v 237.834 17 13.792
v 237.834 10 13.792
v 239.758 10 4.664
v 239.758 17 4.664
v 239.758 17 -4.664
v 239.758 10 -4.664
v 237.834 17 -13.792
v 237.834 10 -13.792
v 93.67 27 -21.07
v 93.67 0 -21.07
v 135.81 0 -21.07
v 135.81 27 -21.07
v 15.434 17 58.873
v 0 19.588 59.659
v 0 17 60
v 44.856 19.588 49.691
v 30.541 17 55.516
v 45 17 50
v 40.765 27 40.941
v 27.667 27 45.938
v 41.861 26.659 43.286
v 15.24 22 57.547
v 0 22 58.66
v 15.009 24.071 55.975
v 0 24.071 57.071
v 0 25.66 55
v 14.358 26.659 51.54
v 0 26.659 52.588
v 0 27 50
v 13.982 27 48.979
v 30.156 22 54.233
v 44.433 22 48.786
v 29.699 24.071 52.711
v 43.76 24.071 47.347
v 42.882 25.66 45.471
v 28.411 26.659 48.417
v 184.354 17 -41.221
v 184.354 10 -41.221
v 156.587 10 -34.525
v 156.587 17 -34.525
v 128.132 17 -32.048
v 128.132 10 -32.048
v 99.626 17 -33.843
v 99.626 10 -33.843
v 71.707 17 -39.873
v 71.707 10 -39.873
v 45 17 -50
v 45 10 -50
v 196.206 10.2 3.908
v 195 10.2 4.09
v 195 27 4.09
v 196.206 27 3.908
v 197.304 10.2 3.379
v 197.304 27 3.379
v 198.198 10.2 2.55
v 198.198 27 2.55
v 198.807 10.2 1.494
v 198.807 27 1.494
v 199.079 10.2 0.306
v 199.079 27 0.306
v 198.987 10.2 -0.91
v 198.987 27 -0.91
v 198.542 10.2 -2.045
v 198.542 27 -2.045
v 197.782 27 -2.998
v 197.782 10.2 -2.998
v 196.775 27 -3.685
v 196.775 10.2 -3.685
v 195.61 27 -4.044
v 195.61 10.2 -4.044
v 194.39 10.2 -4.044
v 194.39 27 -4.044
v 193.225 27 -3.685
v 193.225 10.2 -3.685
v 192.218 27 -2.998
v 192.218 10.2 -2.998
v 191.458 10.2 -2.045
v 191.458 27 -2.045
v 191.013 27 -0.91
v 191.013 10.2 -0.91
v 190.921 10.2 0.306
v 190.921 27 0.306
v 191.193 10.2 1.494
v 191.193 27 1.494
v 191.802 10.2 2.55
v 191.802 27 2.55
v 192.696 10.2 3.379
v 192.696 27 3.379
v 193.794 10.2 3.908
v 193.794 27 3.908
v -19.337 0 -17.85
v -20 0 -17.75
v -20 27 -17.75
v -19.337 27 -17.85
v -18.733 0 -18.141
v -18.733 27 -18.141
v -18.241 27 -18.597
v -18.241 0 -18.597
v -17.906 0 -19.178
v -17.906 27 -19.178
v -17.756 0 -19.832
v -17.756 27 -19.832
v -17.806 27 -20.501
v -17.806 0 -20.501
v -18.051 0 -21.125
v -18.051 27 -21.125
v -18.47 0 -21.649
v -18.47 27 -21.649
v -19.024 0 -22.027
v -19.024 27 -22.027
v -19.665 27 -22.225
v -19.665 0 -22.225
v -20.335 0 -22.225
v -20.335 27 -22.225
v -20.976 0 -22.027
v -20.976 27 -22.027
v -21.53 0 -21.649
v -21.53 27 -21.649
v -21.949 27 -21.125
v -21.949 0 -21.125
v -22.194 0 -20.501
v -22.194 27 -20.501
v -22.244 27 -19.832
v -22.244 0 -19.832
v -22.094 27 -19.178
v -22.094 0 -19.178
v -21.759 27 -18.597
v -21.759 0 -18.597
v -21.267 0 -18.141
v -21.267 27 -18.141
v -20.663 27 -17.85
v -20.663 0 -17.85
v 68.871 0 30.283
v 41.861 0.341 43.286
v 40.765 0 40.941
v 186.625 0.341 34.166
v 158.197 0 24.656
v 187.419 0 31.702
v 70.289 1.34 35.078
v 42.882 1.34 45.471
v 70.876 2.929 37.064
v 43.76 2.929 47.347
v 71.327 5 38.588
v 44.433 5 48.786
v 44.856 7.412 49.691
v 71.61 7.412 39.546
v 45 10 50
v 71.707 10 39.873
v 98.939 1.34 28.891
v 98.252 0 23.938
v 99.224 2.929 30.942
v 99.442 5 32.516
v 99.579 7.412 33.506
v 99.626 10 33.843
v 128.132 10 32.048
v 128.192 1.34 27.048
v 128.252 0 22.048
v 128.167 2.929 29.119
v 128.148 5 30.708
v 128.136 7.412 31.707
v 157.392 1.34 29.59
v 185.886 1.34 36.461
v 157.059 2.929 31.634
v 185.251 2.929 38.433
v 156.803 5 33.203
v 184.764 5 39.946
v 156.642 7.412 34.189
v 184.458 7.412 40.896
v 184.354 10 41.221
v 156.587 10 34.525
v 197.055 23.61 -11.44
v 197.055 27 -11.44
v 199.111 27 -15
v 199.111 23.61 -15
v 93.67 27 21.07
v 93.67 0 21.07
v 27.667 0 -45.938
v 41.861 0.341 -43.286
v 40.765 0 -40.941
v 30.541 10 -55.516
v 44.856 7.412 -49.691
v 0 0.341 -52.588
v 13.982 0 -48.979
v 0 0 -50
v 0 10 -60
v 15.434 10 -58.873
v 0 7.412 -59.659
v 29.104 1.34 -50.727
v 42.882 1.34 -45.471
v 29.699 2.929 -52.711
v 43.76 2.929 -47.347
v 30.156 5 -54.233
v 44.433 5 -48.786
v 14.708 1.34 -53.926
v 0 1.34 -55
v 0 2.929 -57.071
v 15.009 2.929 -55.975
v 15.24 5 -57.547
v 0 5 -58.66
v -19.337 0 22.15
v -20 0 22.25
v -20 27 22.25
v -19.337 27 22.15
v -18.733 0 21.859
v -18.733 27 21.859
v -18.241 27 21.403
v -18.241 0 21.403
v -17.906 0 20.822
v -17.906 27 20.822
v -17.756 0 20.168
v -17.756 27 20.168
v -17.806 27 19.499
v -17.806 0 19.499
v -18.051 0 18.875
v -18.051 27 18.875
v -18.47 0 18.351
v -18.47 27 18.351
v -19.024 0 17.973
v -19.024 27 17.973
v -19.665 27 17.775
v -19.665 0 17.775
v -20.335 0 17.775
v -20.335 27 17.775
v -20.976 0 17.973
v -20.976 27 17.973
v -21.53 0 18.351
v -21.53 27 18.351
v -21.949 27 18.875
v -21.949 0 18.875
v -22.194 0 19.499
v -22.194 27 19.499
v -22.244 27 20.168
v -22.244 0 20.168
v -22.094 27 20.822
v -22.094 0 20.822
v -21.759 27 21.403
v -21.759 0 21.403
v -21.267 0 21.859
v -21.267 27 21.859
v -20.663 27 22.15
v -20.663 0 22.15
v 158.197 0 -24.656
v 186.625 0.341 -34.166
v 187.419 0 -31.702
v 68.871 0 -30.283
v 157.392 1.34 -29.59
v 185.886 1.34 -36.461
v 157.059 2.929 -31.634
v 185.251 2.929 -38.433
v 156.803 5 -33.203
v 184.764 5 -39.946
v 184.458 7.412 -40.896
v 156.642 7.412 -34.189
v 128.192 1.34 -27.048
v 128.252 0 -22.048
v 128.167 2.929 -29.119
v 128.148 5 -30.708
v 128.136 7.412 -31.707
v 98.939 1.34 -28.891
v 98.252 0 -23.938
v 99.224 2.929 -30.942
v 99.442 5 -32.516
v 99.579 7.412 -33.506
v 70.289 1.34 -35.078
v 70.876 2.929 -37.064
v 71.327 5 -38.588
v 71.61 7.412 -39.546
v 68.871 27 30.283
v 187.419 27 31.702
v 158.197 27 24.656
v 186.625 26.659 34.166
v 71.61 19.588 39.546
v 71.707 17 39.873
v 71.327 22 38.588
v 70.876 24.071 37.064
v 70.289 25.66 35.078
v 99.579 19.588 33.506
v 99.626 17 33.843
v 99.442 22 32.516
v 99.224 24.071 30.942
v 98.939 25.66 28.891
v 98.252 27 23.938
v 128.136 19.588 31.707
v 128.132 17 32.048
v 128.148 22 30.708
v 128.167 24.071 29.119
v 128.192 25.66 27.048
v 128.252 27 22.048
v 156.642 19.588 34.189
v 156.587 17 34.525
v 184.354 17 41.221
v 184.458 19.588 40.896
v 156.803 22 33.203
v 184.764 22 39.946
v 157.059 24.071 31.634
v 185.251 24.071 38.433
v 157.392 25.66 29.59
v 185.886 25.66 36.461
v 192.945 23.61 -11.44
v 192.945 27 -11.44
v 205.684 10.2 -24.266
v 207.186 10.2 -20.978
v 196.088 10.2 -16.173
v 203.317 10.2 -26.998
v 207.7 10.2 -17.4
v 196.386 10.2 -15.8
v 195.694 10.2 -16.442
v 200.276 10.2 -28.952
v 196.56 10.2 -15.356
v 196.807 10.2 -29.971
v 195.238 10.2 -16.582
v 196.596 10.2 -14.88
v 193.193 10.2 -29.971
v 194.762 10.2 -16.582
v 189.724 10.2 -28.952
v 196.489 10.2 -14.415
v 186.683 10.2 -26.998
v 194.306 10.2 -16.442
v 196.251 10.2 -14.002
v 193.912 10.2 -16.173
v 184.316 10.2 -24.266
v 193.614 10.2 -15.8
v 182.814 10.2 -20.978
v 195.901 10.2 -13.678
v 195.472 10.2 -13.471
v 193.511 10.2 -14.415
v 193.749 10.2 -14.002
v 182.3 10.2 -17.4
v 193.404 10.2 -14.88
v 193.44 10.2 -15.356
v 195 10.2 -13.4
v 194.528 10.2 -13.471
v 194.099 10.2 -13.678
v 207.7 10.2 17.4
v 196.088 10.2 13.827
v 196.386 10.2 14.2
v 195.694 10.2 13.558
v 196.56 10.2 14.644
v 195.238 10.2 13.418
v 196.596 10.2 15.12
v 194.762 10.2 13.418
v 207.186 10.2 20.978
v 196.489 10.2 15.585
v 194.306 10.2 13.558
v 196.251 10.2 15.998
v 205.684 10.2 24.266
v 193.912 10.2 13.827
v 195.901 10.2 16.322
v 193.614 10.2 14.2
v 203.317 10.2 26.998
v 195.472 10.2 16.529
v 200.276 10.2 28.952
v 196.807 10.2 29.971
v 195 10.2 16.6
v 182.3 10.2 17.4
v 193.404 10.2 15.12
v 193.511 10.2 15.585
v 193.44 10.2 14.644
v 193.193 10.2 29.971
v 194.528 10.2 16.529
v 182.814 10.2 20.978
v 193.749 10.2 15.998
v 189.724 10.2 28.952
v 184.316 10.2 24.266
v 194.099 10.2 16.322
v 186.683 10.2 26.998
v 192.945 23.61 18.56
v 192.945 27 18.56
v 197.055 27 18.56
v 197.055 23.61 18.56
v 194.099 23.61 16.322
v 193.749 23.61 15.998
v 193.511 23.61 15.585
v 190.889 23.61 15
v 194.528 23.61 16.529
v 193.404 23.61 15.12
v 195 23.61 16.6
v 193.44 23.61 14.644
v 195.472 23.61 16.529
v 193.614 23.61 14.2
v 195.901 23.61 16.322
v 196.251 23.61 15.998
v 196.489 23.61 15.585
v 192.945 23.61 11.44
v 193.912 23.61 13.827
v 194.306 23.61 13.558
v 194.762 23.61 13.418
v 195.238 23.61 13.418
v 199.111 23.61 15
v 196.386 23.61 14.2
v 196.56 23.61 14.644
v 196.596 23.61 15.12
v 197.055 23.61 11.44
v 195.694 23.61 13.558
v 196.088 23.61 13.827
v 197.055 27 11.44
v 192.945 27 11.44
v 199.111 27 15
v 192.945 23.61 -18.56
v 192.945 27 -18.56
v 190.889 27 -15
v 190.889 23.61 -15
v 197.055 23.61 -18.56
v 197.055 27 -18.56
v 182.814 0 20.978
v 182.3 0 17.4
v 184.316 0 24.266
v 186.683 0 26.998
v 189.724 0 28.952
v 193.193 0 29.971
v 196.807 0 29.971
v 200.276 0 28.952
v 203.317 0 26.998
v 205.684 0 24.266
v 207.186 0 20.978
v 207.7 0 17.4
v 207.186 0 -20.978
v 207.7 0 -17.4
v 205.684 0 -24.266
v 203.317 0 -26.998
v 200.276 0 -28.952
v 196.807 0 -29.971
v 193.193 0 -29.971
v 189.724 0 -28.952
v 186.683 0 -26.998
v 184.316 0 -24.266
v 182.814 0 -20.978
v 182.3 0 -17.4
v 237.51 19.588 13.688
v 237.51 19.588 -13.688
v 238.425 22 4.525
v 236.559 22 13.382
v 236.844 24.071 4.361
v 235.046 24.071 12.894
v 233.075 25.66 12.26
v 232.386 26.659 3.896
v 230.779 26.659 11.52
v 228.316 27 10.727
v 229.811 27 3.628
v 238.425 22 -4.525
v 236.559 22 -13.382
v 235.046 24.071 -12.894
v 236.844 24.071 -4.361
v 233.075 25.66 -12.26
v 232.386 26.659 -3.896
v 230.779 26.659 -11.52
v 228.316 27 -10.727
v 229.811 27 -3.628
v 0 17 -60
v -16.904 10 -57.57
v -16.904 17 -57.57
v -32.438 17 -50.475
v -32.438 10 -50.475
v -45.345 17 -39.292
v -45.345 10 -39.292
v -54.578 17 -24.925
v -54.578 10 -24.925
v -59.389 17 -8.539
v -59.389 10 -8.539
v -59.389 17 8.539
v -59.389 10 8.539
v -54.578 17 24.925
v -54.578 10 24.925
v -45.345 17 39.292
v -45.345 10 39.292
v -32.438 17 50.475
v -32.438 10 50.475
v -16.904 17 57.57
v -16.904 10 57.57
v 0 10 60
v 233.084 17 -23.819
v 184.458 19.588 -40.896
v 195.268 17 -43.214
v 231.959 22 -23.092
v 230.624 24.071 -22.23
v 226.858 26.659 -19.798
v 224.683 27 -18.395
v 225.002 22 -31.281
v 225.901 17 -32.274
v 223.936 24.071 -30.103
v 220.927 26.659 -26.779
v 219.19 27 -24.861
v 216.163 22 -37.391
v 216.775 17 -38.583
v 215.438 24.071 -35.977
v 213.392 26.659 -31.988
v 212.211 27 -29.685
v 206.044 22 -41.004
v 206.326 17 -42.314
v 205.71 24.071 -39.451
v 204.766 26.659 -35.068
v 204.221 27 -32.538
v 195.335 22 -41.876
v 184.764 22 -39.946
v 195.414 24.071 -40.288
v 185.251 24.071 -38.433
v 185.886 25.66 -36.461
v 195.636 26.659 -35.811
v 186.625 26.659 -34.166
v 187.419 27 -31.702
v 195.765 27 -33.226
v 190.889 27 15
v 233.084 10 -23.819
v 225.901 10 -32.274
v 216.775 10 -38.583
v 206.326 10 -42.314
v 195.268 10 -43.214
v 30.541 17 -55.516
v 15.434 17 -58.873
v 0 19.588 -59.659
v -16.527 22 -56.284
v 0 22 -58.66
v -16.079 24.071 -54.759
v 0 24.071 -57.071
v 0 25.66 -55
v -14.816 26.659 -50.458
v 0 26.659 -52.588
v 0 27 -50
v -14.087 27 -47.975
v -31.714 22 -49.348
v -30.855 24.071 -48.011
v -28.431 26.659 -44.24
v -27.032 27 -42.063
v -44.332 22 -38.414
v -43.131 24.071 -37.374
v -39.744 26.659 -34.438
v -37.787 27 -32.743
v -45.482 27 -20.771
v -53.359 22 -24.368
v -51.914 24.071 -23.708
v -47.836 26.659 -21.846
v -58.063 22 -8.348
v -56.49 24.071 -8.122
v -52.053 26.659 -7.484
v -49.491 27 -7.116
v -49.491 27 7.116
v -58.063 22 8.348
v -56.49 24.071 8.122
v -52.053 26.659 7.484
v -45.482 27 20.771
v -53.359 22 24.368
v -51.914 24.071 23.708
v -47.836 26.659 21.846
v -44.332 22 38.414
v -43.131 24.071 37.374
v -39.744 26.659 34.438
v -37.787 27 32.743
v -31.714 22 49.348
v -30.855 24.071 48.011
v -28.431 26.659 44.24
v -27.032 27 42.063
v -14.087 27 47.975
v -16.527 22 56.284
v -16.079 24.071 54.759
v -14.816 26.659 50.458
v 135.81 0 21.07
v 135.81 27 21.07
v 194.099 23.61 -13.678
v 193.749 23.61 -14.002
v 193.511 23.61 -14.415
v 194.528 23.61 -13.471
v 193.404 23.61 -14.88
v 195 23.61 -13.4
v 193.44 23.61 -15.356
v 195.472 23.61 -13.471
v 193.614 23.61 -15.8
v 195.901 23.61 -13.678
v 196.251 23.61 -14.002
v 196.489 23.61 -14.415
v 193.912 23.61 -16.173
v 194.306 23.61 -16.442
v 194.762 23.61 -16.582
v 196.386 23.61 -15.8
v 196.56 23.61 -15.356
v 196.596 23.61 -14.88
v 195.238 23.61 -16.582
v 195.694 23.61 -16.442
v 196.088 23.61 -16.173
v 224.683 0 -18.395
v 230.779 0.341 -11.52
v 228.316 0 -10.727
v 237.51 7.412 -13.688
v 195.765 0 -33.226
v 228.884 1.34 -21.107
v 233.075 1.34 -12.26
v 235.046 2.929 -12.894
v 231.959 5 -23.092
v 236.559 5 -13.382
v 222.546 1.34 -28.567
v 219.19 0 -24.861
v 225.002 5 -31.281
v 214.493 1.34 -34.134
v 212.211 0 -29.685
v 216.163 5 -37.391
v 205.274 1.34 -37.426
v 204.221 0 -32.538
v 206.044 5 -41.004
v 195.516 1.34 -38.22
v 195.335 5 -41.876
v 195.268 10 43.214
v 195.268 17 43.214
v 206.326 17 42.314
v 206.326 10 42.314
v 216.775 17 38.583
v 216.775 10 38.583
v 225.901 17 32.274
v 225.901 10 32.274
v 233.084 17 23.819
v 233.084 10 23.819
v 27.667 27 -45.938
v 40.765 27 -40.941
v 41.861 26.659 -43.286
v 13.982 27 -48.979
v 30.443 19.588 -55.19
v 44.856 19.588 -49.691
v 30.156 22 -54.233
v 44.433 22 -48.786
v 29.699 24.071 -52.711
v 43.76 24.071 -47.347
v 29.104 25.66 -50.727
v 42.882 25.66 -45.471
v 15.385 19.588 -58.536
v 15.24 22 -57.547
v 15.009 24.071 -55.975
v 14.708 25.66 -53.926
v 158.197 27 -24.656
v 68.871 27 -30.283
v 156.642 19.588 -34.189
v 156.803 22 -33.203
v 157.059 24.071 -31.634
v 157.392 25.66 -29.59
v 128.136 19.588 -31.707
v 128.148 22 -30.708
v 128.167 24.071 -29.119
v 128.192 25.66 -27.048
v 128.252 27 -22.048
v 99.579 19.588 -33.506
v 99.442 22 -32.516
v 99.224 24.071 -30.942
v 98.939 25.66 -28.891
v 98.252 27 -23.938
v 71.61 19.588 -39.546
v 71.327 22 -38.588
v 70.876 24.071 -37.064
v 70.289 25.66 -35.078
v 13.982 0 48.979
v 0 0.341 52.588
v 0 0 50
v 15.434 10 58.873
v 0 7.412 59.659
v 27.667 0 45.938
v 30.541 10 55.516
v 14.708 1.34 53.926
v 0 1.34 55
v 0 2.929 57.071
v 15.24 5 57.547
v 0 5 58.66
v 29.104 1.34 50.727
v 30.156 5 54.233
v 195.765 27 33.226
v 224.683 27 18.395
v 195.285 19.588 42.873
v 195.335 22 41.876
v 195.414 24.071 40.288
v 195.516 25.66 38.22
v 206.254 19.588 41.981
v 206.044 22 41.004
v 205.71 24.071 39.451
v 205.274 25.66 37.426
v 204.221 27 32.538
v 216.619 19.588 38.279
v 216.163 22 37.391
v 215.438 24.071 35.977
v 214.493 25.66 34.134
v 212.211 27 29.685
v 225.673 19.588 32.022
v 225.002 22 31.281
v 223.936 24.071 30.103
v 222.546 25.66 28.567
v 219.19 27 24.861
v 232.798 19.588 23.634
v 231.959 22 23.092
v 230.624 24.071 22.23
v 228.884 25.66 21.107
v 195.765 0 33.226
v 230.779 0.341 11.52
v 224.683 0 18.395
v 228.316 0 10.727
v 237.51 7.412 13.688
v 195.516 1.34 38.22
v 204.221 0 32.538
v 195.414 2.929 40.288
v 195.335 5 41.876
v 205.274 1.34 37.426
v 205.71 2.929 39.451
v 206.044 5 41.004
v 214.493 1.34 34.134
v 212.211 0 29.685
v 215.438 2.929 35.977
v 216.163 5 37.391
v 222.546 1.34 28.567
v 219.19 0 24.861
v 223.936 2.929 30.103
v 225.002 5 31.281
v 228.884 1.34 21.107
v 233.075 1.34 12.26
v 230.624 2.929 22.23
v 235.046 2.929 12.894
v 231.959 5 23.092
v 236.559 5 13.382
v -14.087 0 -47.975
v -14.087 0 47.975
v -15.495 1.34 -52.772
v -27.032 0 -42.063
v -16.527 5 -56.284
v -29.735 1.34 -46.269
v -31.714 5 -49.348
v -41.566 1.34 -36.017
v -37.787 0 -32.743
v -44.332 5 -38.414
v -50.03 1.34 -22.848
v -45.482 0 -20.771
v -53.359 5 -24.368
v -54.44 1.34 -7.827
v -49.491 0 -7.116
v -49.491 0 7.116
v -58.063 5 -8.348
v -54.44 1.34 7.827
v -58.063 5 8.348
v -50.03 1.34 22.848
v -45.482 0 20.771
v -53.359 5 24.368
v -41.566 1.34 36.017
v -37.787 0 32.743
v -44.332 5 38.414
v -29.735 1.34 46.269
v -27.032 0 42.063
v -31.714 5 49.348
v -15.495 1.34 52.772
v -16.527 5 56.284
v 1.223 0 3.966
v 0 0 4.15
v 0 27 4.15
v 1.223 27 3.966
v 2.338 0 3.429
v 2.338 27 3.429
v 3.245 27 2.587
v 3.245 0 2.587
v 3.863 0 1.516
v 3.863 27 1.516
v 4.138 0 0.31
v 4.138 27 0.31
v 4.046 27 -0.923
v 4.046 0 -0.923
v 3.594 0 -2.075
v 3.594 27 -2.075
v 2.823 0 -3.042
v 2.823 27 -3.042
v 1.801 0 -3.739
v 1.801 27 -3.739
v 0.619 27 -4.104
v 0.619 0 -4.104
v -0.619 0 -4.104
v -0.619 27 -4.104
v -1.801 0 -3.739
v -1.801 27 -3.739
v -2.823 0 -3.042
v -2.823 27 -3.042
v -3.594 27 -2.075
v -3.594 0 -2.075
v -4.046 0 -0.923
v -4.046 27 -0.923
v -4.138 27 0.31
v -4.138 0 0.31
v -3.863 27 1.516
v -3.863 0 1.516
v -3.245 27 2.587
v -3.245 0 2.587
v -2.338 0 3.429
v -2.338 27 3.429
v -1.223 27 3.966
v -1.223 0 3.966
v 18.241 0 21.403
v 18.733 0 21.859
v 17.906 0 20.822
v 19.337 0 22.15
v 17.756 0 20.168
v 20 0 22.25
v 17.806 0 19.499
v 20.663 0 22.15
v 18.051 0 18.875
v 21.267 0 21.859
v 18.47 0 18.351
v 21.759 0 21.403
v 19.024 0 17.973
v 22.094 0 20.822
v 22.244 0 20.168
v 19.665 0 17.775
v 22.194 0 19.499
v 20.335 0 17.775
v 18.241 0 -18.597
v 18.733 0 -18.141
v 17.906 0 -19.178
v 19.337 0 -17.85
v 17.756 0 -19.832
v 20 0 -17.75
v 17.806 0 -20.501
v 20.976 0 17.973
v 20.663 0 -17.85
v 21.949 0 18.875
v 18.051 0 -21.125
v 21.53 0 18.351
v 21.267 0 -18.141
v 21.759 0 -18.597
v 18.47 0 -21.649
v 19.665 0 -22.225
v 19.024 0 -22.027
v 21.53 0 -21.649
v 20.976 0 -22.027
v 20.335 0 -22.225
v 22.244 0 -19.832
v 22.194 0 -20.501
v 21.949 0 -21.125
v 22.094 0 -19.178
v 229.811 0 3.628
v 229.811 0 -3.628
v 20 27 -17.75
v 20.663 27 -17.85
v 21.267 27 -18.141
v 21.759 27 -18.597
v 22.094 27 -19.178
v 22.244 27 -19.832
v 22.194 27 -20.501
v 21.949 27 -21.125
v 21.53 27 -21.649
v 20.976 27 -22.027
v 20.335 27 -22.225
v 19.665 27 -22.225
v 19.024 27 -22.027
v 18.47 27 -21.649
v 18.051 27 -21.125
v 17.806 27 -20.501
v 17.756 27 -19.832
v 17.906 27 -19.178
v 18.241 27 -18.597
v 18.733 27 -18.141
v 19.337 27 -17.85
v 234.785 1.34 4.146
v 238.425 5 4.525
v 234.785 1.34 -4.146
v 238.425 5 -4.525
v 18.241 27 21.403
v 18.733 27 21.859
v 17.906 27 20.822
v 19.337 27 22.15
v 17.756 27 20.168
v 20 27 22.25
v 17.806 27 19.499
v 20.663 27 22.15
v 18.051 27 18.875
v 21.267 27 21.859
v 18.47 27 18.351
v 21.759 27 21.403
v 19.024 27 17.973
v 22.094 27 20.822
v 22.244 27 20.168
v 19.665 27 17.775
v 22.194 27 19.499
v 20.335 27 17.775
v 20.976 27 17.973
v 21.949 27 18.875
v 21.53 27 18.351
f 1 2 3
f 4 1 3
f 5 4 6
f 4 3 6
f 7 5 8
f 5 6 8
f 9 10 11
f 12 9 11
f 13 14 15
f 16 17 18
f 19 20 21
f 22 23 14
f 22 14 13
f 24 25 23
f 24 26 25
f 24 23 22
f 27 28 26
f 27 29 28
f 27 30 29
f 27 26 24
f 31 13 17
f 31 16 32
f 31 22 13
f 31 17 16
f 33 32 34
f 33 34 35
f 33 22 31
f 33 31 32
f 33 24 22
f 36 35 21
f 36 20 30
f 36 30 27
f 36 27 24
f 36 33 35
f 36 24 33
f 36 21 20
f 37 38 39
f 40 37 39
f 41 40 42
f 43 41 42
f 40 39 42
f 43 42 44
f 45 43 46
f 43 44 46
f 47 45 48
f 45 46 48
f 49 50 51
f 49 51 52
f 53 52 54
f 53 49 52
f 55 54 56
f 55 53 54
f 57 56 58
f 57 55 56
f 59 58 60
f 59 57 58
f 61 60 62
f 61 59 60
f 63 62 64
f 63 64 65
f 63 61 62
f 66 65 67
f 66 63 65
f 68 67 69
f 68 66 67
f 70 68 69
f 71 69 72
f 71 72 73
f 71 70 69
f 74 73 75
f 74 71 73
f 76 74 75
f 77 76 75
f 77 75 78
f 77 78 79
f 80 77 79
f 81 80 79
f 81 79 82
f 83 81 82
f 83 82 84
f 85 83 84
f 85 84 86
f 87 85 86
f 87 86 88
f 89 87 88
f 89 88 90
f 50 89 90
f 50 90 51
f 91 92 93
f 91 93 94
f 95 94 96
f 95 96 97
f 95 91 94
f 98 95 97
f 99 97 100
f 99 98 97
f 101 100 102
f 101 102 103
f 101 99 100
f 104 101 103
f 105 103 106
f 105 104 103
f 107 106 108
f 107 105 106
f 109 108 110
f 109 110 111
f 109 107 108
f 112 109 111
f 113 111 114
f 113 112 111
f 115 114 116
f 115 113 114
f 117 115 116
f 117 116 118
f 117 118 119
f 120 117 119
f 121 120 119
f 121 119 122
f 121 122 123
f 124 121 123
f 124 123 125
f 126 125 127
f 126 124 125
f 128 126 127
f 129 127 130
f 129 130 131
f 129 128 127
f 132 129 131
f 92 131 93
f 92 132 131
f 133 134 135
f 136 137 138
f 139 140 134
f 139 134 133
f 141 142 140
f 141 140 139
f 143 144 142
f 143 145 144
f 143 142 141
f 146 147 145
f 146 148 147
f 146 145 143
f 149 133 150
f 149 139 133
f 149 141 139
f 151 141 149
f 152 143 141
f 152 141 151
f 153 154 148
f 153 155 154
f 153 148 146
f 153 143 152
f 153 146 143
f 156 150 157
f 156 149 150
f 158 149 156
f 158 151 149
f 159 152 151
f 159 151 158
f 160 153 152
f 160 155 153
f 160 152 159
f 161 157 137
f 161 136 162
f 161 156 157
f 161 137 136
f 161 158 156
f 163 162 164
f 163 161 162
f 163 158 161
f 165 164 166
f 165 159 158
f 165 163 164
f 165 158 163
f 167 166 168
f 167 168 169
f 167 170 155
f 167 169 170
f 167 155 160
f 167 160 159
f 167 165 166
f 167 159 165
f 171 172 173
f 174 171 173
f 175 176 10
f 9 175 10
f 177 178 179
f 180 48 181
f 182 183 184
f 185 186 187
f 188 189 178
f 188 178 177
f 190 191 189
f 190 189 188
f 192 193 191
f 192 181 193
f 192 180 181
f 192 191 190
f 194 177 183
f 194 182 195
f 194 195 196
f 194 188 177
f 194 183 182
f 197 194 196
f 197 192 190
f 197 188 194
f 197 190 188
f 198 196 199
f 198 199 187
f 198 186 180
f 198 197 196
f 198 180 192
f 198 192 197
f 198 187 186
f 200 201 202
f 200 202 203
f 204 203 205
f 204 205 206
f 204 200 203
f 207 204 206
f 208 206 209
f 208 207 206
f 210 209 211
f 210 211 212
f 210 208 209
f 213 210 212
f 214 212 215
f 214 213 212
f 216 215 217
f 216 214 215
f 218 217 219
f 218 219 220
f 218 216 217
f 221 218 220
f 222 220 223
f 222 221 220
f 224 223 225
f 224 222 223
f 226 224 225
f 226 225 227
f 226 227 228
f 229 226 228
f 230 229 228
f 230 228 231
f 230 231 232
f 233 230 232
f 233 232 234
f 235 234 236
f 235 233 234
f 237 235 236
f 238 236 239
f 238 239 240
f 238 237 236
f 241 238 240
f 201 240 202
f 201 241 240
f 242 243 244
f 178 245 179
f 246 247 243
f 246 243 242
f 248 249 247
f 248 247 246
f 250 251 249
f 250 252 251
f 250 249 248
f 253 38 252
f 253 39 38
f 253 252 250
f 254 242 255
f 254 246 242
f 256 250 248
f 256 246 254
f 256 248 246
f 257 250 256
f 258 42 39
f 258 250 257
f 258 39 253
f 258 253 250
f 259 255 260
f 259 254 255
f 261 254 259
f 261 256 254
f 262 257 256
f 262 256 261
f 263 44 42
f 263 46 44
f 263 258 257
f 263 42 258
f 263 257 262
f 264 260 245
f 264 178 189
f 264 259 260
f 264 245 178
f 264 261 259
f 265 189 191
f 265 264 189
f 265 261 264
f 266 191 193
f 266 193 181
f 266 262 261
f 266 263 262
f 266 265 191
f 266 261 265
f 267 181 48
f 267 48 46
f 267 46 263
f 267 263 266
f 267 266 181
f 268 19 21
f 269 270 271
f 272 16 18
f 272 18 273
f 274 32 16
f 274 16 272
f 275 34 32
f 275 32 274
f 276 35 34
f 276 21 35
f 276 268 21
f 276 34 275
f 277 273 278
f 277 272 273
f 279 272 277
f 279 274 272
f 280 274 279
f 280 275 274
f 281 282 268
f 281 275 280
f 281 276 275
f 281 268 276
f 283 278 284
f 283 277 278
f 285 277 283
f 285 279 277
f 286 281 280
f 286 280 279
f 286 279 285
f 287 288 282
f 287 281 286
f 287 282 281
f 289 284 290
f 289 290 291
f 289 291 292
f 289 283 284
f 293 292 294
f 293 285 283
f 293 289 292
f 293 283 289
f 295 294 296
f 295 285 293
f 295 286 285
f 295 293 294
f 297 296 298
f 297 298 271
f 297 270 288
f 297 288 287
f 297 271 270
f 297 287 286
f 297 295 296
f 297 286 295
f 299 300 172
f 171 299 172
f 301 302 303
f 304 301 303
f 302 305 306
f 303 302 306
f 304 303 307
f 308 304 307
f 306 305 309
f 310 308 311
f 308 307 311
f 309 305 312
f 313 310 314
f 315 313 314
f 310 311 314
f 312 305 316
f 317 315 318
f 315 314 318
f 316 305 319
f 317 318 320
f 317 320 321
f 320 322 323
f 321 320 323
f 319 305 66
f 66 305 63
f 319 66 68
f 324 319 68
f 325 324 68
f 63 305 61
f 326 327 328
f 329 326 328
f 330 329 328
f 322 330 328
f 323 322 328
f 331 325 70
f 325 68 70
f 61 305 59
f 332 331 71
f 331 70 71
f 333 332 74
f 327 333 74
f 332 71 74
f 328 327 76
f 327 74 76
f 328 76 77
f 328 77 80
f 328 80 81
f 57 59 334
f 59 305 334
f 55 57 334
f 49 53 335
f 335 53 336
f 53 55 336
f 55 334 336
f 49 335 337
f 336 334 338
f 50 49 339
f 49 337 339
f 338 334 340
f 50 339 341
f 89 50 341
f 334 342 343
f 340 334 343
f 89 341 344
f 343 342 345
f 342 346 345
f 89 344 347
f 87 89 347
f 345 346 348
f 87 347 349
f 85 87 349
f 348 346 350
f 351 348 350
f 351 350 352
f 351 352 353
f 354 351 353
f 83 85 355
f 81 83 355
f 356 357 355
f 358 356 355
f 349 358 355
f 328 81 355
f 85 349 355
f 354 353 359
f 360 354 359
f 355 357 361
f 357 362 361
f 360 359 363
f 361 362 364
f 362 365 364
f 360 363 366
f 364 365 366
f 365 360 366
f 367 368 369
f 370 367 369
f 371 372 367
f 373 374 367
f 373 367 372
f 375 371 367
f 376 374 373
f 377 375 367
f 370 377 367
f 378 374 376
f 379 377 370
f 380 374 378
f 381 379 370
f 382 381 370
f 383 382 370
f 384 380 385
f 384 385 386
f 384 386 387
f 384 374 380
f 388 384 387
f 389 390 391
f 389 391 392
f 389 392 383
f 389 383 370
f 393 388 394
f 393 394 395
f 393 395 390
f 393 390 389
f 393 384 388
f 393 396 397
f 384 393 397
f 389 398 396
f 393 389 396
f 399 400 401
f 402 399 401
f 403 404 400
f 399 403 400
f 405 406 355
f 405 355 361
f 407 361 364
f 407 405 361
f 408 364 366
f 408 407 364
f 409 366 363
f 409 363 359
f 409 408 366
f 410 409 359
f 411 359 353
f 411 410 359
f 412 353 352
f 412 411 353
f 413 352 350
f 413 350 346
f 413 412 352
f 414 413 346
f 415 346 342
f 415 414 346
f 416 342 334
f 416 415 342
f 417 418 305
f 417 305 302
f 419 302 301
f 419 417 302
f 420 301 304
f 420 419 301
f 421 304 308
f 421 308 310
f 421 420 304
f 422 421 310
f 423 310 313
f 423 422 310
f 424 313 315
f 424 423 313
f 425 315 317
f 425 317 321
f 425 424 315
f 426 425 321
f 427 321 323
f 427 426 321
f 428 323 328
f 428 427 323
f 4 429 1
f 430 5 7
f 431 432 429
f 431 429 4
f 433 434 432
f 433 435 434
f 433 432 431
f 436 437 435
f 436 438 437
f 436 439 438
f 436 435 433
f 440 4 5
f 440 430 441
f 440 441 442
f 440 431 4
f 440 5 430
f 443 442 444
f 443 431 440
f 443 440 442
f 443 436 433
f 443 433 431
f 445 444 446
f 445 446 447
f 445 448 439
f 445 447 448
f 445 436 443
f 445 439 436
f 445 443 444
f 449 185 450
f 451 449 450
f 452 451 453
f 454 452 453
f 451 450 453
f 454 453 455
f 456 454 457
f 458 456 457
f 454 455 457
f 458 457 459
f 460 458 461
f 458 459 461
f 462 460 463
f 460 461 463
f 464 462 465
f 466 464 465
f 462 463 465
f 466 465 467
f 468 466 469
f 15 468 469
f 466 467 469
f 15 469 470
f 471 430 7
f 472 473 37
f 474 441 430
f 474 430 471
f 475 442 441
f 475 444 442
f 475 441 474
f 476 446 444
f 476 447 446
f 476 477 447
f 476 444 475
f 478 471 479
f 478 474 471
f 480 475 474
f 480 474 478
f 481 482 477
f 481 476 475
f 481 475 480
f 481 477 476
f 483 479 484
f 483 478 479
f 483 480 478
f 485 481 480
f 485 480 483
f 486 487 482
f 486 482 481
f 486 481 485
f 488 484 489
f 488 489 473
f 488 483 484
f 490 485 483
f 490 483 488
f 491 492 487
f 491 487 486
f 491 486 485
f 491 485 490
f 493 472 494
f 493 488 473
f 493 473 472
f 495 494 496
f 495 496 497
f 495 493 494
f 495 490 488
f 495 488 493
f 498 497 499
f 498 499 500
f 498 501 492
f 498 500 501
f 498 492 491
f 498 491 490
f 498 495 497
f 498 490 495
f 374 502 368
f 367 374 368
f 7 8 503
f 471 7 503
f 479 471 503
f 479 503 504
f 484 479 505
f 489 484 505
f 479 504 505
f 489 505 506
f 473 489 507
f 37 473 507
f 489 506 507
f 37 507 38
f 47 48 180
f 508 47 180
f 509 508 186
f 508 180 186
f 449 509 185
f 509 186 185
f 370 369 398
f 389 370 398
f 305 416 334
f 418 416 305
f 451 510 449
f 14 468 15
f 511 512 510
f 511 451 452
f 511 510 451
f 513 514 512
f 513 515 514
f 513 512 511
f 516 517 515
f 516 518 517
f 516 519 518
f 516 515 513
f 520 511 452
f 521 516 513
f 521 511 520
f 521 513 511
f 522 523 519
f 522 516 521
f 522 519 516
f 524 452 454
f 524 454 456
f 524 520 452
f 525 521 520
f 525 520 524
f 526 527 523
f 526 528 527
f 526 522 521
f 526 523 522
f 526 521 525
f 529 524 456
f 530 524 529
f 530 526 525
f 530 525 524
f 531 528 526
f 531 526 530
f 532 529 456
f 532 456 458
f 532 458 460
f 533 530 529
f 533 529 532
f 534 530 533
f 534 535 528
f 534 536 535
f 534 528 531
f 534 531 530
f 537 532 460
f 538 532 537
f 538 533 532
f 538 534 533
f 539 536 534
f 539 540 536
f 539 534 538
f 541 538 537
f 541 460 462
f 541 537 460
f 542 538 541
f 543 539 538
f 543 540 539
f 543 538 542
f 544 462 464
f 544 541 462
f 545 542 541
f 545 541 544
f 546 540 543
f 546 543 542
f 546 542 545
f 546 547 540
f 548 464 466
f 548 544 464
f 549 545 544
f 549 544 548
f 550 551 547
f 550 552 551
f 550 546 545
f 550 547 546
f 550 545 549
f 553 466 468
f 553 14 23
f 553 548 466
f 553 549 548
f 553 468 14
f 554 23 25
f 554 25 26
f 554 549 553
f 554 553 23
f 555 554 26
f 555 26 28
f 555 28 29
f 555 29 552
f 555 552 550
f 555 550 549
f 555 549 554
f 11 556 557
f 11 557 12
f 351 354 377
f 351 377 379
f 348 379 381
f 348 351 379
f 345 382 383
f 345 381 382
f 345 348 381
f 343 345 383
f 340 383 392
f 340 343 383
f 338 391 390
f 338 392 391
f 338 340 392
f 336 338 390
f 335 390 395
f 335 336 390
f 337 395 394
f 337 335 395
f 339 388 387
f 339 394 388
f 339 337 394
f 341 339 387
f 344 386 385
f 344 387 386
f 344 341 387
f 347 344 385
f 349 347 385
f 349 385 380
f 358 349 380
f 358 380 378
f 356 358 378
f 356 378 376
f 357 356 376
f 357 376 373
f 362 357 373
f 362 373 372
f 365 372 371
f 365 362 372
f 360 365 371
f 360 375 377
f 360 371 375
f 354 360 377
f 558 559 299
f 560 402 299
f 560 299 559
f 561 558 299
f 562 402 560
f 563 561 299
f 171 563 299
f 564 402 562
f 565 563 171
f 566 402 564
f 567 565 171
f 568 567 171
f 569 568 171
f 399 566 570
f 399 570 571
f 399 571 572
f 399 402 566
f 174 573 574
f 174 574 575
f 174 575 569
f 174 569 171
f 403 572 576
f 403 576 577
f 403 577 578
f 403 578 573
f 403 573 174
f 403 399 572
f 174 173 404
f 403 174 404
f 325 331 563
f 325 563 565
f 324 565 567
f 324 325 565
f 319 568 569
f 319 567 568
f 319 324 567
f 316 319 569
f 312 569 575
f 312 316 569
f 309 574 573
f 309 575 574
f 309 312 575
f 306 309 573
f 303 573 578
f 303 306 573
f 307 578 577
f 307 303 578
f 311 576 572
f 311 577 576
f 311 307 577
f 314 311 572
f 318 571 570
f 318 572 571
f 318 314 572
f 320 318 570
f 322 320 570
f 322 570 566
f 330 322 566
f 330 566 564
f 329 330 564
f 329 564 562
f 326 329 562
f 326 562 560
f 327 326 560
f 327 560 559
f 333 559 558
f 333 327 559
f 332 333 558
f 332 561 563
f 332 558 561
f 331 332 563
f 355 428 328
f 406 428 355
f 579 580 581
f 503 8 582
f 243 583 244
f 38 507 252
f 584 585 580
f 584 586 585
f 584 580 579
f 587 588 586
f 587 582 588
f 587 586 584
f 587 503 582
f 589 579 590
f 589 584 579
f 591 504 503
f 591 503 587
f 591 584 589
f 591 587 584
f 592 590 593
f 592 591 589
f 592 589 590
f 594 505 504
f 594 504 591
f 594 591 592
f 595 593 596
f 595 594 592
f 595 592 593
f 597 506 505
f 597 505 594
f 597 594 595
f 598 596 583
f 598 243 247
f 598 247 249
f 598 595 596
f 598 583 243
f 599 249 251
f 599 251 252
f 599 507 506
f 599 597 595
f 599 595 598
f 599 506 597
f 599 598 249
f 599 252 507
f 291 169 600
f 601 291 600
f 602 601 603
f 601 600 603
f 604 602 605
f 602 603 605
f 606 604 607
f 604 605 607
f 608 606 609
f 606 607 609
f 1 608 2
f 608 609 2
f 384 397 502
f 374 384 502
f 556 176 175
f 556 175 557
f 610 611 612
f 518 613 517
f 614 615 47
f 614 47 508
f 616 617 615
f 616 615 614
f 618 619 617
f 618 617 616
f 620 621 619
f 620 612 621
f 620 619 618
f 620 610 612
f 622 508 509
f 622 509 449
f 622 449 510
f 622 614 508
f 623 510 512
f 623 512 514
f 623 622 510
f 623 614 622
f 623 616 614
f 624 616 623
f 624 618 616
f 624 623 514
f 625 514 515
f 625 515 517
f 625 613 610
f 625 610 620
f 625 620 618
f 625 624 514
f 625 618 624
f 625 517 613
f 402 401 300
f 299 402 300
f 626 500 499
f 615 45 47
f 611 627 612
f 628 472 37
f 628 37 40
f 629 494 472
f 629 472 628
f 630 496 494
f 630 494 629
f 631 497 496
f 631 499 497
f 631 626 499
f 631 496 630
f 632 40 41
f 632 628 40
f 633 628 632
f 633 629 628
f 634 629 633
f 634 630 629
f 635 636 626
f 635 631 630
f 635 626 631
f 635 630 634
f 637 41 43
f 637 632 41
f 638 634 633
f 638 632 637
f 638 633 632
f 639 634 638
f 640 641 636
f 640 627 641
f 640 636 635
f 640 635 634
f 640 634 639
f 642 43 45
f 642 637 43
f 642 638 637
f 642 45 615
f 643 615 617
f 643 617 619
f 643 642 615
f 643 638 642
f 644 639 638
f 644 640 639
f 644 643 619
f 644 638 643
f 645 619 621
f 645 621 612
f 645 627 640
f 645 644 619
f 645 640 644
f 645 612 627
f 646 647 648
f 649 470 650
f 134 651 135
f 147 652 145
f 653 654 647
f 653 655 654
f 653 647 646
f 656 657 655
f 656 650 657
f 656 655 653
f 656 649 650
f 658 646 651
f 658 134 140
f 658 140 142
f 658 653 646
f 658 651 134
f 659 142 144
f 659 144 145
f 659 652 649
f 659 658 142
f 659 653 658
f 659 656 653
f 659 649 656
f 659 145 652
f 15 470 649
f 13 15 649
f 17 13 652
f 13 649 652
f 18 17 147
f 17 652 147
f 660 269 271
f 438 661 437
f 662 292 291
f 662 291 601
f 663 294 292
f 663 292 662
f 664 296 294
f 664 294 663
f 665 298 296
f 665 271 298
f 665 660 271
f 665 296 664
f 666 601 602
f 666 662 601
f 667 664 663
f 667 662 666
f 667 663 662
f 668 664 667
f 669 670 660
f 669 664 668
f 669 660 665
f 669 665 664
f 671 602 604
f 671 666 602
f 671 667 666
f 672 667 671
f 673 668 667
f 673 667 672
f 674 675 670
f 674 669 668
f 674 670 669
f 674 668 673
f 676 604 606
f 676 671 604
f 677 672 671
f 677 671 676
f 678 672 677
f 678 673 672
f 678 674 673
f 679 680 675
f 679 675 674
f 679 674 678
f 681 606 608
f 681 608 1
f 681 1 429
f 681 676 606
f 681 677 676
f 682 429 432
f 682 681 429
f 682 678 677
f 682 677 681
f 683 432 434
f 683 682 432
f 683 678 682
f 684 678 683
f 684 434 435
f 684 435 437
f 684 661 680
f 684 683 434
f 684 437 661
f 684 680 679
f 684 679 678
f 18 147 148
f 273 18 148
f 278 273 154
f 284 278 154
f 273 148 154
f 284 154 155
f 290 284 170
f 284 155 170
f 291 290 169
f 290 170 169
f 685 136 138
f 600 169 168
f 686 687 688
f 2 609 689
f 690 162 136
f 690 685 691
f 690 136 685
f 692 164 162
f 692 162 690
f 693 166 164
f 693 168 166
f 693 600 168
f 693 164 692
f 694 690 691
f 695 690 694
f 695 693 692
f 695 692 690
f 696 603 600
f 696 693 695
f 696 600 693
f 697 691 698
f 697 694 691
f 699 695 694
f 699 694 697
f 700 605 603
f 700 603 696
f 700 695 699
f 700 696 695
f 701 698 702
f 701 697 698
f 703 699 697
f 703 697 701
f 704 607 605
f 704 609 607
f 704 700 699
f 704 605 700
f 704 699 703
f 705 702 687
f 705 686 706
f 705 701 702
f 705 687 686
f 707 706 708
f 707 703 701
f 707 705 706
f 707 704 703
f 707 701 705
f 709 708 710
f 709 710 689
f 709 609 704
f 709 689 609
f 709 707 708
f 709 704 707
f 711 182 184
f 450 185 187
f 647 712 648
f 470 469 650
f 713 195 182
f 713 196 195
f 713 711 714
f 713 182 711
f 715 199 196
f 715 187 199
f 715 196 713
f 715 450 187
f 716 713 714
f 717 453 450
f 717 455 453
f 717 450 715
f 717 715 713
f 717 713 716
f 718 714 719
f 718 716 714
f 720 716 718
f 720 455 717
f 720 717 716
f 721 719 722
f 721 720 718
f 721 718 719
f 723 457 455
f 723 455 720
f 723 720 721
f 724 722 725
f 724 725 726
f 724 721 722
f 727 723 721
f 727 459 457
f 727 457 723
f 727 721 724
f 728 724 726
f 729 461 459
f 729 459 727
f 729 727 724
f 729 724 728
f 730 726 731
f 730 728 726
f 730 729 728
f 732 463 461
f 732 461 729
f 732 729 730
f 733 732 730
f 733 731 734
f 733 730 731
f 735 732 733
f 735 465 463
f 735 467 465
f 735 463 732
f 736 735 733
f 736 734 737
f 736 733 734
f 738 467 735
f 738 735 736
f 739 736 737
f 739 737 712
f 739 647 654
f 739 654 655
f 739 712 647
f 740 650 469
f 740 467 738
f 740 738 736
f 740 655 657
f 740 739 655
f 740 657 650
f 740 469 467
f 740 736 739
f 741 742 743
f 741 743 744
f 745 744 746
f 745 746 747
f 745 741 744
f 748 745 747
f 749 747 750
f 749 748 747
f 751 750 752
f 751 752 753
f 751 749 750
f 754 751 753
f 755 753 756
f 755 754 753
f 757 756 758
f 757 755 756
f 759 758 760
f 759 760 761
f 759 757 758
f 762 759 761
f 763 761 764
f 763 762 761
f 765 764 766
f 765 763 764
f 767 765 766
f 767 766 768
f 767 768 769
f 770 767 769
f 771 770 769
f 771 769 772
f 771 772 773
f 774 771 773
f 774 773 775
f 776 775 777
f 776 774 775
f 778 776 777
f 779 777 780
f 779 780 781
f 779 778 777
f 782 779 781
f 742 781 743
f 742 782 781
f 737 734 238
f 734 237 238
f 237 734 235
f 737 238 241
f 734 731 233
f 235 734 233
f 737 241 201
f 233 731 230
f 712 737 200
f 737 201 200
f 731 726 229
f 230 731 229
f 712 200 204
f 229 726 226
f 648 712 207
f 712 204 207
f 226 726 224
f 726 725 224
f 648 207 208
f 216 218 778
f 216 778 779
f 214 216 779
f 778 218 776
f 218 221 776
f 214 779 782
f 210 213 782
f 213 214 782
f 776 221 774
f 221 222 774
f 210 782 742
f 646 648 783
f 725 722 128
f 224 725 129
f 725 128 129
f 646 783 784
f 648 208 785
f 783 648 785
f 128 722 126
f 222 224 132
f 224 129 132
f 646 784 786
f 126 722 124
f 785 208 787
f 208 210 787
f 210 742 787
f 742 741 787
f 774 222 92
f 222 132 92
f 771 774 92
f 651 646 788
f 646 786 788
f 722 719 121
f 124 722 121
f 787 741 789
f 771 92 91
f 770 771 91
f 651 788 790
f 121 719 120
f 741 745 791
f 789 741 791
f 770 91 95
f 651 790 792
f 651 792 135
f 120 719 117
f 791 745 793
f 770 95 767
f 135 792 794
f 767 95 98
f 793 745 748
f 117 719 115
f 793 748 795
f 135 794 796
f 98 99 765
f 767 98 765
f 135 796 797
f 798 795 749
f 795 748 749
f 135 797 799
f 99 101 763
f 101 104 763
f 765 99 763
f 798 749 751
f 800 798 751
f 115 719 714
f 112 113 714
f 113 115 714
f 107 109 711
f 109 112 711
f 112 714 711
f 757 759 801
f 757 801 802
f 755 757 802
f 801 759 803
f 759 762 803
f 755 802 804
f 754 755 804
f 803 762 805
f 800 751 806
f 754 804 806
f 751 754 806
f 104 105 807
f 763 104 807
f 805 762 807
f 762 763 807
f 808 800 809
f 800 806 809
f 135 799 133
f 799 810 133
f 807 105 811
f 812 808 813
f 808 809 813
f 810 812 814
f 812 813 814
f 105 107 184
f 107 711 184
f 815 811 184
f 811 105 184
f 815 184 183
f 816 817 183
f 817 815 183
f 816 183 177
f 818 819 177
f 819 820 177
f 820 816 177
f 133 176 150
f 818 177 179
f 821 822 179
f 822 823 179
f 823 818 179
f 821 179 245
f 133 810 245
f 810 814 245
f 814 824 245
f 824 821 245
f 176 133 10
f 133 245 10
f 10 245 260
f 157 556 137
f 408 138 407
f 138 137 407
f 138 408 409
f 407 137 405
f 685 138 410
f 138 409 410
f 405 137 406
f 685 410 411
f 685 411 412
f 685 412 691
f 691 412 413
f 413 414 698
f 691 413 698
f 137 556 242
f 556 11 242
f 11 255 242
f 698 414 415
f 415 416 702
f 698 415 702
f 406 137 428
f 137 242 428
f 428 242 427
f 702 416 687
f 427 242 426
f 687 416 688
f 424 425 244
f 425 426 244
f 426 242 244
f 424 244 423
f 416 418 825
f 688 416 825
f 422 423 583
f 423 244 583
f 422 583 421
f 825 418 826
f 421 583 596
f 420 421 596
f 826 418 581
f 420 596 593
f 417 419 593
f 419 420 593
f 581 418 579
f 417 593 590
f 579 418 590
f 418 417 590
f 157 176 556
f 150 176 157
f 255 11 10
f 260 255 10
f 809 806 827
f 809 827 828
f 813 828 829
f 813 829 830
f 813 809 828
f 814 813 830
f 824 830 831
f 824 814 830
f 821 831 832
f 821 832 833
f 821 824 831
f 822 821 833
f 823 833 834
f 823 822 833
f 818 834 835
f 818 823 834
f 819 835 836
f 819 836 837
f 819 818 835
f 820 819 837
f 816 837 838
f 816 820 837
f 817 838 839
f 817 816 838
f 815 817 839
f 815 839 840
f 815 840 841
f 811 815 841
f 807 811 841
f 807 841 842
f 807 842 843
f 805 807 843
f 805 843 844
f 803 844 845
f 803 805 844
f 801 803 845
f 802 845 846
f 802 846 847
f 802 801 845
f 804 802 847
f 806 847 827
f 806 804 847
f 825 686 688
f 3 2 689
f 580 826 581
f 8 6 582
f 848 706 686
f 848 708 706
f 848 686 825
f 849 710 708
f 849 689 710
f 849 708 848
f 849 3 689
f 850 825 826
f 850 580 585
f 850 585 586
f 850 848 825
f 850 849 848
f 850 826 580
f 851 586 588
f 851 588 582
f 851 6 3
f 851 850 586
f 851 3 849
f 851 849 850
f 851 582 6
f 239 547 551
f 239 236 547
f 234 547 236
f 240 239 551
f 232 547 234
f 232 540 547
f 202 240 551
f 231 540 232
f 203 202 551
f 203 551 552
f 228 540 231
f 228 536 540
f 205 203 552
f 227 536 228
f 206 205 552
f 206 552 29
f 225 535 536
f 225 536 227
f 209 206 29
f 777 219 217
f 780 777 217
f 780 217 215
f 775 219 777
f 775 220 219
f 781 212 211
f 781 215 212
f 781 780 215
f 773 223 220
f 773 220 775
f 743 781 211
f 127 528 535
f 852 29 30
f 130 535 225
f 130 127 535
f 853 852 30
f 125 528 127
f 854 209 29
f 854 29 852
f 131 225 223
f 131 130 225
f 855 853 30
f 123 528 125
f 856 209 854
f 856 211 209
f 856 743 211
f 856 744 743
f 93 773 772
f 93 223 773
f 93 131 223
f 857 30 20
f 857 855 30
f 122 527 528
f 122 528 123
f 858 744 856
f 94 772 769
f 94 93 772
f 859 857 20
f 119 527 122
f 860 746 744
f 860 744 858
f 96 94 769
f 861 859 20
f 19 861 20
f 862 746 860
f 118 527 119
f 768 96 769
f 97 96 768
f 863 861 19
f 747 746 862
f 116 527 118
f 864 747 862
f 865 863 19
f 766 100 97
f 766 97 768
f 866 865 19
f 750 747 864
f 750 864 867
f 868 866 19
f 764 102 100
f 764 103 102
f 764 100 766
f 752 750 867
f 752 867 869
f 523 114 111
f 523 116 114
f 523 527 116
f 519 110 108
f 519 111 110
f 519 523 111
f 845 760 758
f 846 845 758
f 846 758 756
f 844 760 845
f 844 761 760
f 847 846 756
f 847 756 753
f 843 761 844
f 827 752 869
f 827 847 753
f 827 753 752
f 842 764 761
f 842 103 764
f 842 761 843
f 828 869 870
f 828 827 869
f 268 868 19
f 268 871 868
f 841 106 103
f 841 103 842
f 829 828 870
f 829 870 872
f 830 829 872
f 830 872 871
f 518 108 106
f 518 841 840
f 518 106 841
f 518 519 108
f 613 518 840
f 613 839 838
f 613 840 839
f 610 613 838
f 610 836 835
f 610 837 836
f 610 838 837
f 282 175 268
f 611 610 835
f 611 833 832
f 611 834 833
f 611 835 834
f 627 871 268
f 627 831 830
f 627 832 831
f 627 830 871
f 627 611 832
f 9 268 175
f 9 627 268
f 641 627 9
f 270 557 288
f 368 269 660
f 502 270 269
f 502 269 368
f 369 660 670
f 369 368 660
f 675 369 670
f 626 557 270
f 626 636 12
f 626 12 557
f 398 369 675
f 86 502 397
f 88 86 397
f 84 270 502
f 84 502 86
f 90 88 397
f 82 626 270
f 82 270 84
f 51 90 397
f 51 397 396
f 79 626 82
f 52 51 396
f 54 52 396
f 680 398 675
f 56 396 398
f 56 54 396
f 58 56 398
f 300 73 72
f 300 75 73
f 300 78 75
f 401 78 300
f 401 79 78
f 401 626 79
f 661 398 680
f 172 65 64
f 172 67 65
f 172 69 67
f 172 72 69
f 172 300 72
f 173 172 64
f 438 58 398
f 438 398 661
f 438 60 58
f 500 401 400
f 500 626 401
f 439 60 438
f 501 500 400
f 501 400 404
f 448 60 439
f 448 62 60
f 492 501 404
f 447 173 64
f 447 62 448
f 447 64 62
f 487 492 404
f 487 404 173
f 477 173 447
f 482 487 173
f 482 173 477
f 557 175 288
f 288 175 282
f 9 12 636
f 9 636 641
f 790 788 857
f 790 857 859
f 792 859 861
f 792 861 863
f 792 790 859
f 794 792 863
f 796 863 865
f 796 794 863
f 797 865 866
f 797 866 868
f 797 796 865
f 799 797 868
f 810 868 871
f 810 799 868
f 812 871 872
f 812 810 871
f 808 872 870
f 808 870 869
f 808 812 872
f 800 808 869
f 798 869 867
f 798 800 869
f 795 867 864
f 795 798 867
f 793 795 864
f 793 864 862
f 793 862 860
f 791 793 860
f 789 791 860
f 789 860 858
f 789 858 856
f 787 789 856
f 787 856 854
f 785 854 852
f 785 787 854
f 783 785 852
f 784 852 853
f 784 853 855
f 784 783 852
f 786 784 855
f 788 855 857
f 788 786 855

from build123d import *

# Parameters (mm, degrees)
SKETCH1_R               = 2.25
SKETCH1_R_2             = 4.15
SKETCH1_R_3             = 4.09
SKETCH1_R_4             = 1.6
SKETCH1_W               = 42.14
SKETCH1_H               = 42.14
SALIENTE_EXTRUIR1_DEPTH = 27
REDONDEO1_R             = 42.5
REDONDEO2_R             = 10
CORTAR_EXTRUIR1_DEPTH   = 10.2
CORTAR_EXTRUIR2_DEPTH   = 3.39


with BuildPart() as part:
    # Sketch1 → Saliente-Extruir1 (new body)
    with BuildSketch(Plane(origin=(0, 0, 0), x_dir=(1, 0, 0), z_dir=(0, 1, 0))):
        with BuildLine():
            ThreePointArc((0, 60), (-60, 0), (0, -60))
            ThreePointArc((0, -60), (23.048861143, -57.469875145), (45, -50))
            ThreePointArc((45, -50), (119.487995331, -32.139859918), (195, -45))
            ThreePointArc((195, -45), (240, 0), (195, 45))
            ThreePointArc((195, 45), (119.487995331, 32.139859918), (45, 50))
            ThreePointArc((45, 50), (23.048861143, 57.469875145), (0, 60))
        make_face()
        with Locations(Location((-20, -20, 0), (0, 0, 270))):
            Circle(SKETCH1_R, mode=Mode.SUBTRACT)
        with Locations(Location((20, -20, 0), (0, 0, 270))):
            Circle(SKETCH1_R, mode=Mode.SUBTRACT)
        with Locations(Location((-20, 20, 0), (0, 0, 270))):
            Circle(SKETCH1_R, mode=Mode.SUBTRACT)
        with Locations(Location((20, 20, 0), (0, 0, 270))):
            Circle(SKETCH1_R, mode=Mode.SUBTRACT)
        with Locations(Location((0, 0, 0), (0, 0, 270))):
            Circle(SKETCH1_R_2, mode=Mode.SUBTRACT)
        with Locations(Location((195, 0, 0), (0, 0, 270))):
            Circle(SKETCH1_R_3, mode=Mode.SUBTRACT)
        with Locations(Location((195, -15, 0), (0, 0, 270))):
            Circle(SKETCH1_R_4, mode=Mode.SUBTRACT)
        with Locations(Location((195, 15, 0), (0, 0, 270))):
            Circle(SKETCH1_R_4, mode=Mode.SUBTRACT)
        with Locations((114.74, 0)):
            Rectangle(SKETCH1_W, SKETCH1_H, mode=Mode.SUBTRACT)
    extrude(amount=SALIENTE_EXTRUIR1_DEPTH)

    # Redondeo1
    # the kernel refuses this fillet: 42.5 mm, written as the material it takes off along each edge
    with BuildSketch(Plane(origin=(195, -132.493054203, -45), x_dir=(0.8082364962283539, 0, 0.5888580186806613), z_dir=(0, 1, 0))) as redondeo1_piece_1:
        with BuildLine():
            CenterArc((27.970755887, -34.35005109), REDONDEO1_R, 53.923988444, 90)
            ThreePointArc((-6.379295202, -9.323585296), (-3.120659761, -4.708994854), (0, 0))
            ThreePointArc((0, 0), (26.498610841, 8.62935767), (52.997221681, 0))
        make_face()
    extrude(amount=291.986108406, mode=Mode.SUBTRACT)
    with BuildSketch(Plane(origin=(195, -132.493054203, 45), x_dir=(-0.9423869480769151, 0, -0.3345247974280495), z_dir=(0, 1, 0))) as redondeo1_piece_2:
        with BuildLine():
            CenterArc((12.554710632, -42.481389287), REDONDEO1_R, 91.695666833, 90)
            ThreePointArc((-29.926678654, -43.73899188), (-22.085210872, -16.996636462), (0, 0))
            ThreePointArc((0, 0), (5.64855402, -0.083590492), (11.297108039, 0))
        make_face()
    extrude(amount=291.986108406, mode=Mode.SUBTRACT)

    # Redondeo2
    redondeo2_edges = [part.edges().sort_by_distance(p)[0] for p in [
        (23.048861143, 27, 57.469875145),
        (113.845361587, 27, 32.411584628),
        (23.048861143, 27, -57.469875145),
        (240, 0, 0),
        (240, 27, 0),
        (113.845361587, 0, -32.411584628),
        (216.774685632, 0, -38.582680786),
        (216.774685632, 0, 38.582680786),
        (113.845361587, 27, -32.411584628),
        (216.774685632, 27, -38.582680786),
        (216.774685632, 27, 38.582680786),
        (113.845361587, 0, 32.411584628),
        (23.048861143, 0, 57.469875145),
        (-60, 0, 0),
        (23.048861143, 0, -57.469875145),
        (-60, 27, 0),
    ]]
    fillet(redondeo2_edges, radius=REDONDEO2_R)

    # Croquis1 → Cortar-Extruir1 (cut)
    with BuildSketch(Plane.XZ):
        with BuildLine():
            Line((207.7, 17.4), (207.7, -17.4))
            ThreePointArc((207.7, -17.4), (195, -30.1), (182.3, -17.4))
            Line((182.3, -17.4), (182.3, 17.4))
            ThreePointArc((182.3, 17.4), (195, 30.1), (207.7, 17.4))
        make_face()
    extrude(amount=-CORTAR_EXTRUIR1_DEPTH, mode=Mode.SUBTRACT)

    # Croquis2 → Cortar-Extruir2 (cut)
    with BuildSketch(Plane(origin=(0, 27, 0), x_dir=(1, 0, 0), z_dir=(0, 1, 0))):
        Polygon((199.110733917, 15), (197.055366958, 18.56), (192.944633042, 18.56), (190.889266083, 15), (192.944633042, 11.44), (197.055366958, 11.44), align=None)
        Polygon((197.055366958, -11.44), (192.944633042, -11.44), (190.889266083, -15), (192.944633042, -18.56), (197.055366958, -18.56), (199.110733917, -15), align=None)
    extrude(amount=-CORTAR_EXTRUIR2_DEPTH, mode=Mode.SUBTRACT)


solid = part.part
